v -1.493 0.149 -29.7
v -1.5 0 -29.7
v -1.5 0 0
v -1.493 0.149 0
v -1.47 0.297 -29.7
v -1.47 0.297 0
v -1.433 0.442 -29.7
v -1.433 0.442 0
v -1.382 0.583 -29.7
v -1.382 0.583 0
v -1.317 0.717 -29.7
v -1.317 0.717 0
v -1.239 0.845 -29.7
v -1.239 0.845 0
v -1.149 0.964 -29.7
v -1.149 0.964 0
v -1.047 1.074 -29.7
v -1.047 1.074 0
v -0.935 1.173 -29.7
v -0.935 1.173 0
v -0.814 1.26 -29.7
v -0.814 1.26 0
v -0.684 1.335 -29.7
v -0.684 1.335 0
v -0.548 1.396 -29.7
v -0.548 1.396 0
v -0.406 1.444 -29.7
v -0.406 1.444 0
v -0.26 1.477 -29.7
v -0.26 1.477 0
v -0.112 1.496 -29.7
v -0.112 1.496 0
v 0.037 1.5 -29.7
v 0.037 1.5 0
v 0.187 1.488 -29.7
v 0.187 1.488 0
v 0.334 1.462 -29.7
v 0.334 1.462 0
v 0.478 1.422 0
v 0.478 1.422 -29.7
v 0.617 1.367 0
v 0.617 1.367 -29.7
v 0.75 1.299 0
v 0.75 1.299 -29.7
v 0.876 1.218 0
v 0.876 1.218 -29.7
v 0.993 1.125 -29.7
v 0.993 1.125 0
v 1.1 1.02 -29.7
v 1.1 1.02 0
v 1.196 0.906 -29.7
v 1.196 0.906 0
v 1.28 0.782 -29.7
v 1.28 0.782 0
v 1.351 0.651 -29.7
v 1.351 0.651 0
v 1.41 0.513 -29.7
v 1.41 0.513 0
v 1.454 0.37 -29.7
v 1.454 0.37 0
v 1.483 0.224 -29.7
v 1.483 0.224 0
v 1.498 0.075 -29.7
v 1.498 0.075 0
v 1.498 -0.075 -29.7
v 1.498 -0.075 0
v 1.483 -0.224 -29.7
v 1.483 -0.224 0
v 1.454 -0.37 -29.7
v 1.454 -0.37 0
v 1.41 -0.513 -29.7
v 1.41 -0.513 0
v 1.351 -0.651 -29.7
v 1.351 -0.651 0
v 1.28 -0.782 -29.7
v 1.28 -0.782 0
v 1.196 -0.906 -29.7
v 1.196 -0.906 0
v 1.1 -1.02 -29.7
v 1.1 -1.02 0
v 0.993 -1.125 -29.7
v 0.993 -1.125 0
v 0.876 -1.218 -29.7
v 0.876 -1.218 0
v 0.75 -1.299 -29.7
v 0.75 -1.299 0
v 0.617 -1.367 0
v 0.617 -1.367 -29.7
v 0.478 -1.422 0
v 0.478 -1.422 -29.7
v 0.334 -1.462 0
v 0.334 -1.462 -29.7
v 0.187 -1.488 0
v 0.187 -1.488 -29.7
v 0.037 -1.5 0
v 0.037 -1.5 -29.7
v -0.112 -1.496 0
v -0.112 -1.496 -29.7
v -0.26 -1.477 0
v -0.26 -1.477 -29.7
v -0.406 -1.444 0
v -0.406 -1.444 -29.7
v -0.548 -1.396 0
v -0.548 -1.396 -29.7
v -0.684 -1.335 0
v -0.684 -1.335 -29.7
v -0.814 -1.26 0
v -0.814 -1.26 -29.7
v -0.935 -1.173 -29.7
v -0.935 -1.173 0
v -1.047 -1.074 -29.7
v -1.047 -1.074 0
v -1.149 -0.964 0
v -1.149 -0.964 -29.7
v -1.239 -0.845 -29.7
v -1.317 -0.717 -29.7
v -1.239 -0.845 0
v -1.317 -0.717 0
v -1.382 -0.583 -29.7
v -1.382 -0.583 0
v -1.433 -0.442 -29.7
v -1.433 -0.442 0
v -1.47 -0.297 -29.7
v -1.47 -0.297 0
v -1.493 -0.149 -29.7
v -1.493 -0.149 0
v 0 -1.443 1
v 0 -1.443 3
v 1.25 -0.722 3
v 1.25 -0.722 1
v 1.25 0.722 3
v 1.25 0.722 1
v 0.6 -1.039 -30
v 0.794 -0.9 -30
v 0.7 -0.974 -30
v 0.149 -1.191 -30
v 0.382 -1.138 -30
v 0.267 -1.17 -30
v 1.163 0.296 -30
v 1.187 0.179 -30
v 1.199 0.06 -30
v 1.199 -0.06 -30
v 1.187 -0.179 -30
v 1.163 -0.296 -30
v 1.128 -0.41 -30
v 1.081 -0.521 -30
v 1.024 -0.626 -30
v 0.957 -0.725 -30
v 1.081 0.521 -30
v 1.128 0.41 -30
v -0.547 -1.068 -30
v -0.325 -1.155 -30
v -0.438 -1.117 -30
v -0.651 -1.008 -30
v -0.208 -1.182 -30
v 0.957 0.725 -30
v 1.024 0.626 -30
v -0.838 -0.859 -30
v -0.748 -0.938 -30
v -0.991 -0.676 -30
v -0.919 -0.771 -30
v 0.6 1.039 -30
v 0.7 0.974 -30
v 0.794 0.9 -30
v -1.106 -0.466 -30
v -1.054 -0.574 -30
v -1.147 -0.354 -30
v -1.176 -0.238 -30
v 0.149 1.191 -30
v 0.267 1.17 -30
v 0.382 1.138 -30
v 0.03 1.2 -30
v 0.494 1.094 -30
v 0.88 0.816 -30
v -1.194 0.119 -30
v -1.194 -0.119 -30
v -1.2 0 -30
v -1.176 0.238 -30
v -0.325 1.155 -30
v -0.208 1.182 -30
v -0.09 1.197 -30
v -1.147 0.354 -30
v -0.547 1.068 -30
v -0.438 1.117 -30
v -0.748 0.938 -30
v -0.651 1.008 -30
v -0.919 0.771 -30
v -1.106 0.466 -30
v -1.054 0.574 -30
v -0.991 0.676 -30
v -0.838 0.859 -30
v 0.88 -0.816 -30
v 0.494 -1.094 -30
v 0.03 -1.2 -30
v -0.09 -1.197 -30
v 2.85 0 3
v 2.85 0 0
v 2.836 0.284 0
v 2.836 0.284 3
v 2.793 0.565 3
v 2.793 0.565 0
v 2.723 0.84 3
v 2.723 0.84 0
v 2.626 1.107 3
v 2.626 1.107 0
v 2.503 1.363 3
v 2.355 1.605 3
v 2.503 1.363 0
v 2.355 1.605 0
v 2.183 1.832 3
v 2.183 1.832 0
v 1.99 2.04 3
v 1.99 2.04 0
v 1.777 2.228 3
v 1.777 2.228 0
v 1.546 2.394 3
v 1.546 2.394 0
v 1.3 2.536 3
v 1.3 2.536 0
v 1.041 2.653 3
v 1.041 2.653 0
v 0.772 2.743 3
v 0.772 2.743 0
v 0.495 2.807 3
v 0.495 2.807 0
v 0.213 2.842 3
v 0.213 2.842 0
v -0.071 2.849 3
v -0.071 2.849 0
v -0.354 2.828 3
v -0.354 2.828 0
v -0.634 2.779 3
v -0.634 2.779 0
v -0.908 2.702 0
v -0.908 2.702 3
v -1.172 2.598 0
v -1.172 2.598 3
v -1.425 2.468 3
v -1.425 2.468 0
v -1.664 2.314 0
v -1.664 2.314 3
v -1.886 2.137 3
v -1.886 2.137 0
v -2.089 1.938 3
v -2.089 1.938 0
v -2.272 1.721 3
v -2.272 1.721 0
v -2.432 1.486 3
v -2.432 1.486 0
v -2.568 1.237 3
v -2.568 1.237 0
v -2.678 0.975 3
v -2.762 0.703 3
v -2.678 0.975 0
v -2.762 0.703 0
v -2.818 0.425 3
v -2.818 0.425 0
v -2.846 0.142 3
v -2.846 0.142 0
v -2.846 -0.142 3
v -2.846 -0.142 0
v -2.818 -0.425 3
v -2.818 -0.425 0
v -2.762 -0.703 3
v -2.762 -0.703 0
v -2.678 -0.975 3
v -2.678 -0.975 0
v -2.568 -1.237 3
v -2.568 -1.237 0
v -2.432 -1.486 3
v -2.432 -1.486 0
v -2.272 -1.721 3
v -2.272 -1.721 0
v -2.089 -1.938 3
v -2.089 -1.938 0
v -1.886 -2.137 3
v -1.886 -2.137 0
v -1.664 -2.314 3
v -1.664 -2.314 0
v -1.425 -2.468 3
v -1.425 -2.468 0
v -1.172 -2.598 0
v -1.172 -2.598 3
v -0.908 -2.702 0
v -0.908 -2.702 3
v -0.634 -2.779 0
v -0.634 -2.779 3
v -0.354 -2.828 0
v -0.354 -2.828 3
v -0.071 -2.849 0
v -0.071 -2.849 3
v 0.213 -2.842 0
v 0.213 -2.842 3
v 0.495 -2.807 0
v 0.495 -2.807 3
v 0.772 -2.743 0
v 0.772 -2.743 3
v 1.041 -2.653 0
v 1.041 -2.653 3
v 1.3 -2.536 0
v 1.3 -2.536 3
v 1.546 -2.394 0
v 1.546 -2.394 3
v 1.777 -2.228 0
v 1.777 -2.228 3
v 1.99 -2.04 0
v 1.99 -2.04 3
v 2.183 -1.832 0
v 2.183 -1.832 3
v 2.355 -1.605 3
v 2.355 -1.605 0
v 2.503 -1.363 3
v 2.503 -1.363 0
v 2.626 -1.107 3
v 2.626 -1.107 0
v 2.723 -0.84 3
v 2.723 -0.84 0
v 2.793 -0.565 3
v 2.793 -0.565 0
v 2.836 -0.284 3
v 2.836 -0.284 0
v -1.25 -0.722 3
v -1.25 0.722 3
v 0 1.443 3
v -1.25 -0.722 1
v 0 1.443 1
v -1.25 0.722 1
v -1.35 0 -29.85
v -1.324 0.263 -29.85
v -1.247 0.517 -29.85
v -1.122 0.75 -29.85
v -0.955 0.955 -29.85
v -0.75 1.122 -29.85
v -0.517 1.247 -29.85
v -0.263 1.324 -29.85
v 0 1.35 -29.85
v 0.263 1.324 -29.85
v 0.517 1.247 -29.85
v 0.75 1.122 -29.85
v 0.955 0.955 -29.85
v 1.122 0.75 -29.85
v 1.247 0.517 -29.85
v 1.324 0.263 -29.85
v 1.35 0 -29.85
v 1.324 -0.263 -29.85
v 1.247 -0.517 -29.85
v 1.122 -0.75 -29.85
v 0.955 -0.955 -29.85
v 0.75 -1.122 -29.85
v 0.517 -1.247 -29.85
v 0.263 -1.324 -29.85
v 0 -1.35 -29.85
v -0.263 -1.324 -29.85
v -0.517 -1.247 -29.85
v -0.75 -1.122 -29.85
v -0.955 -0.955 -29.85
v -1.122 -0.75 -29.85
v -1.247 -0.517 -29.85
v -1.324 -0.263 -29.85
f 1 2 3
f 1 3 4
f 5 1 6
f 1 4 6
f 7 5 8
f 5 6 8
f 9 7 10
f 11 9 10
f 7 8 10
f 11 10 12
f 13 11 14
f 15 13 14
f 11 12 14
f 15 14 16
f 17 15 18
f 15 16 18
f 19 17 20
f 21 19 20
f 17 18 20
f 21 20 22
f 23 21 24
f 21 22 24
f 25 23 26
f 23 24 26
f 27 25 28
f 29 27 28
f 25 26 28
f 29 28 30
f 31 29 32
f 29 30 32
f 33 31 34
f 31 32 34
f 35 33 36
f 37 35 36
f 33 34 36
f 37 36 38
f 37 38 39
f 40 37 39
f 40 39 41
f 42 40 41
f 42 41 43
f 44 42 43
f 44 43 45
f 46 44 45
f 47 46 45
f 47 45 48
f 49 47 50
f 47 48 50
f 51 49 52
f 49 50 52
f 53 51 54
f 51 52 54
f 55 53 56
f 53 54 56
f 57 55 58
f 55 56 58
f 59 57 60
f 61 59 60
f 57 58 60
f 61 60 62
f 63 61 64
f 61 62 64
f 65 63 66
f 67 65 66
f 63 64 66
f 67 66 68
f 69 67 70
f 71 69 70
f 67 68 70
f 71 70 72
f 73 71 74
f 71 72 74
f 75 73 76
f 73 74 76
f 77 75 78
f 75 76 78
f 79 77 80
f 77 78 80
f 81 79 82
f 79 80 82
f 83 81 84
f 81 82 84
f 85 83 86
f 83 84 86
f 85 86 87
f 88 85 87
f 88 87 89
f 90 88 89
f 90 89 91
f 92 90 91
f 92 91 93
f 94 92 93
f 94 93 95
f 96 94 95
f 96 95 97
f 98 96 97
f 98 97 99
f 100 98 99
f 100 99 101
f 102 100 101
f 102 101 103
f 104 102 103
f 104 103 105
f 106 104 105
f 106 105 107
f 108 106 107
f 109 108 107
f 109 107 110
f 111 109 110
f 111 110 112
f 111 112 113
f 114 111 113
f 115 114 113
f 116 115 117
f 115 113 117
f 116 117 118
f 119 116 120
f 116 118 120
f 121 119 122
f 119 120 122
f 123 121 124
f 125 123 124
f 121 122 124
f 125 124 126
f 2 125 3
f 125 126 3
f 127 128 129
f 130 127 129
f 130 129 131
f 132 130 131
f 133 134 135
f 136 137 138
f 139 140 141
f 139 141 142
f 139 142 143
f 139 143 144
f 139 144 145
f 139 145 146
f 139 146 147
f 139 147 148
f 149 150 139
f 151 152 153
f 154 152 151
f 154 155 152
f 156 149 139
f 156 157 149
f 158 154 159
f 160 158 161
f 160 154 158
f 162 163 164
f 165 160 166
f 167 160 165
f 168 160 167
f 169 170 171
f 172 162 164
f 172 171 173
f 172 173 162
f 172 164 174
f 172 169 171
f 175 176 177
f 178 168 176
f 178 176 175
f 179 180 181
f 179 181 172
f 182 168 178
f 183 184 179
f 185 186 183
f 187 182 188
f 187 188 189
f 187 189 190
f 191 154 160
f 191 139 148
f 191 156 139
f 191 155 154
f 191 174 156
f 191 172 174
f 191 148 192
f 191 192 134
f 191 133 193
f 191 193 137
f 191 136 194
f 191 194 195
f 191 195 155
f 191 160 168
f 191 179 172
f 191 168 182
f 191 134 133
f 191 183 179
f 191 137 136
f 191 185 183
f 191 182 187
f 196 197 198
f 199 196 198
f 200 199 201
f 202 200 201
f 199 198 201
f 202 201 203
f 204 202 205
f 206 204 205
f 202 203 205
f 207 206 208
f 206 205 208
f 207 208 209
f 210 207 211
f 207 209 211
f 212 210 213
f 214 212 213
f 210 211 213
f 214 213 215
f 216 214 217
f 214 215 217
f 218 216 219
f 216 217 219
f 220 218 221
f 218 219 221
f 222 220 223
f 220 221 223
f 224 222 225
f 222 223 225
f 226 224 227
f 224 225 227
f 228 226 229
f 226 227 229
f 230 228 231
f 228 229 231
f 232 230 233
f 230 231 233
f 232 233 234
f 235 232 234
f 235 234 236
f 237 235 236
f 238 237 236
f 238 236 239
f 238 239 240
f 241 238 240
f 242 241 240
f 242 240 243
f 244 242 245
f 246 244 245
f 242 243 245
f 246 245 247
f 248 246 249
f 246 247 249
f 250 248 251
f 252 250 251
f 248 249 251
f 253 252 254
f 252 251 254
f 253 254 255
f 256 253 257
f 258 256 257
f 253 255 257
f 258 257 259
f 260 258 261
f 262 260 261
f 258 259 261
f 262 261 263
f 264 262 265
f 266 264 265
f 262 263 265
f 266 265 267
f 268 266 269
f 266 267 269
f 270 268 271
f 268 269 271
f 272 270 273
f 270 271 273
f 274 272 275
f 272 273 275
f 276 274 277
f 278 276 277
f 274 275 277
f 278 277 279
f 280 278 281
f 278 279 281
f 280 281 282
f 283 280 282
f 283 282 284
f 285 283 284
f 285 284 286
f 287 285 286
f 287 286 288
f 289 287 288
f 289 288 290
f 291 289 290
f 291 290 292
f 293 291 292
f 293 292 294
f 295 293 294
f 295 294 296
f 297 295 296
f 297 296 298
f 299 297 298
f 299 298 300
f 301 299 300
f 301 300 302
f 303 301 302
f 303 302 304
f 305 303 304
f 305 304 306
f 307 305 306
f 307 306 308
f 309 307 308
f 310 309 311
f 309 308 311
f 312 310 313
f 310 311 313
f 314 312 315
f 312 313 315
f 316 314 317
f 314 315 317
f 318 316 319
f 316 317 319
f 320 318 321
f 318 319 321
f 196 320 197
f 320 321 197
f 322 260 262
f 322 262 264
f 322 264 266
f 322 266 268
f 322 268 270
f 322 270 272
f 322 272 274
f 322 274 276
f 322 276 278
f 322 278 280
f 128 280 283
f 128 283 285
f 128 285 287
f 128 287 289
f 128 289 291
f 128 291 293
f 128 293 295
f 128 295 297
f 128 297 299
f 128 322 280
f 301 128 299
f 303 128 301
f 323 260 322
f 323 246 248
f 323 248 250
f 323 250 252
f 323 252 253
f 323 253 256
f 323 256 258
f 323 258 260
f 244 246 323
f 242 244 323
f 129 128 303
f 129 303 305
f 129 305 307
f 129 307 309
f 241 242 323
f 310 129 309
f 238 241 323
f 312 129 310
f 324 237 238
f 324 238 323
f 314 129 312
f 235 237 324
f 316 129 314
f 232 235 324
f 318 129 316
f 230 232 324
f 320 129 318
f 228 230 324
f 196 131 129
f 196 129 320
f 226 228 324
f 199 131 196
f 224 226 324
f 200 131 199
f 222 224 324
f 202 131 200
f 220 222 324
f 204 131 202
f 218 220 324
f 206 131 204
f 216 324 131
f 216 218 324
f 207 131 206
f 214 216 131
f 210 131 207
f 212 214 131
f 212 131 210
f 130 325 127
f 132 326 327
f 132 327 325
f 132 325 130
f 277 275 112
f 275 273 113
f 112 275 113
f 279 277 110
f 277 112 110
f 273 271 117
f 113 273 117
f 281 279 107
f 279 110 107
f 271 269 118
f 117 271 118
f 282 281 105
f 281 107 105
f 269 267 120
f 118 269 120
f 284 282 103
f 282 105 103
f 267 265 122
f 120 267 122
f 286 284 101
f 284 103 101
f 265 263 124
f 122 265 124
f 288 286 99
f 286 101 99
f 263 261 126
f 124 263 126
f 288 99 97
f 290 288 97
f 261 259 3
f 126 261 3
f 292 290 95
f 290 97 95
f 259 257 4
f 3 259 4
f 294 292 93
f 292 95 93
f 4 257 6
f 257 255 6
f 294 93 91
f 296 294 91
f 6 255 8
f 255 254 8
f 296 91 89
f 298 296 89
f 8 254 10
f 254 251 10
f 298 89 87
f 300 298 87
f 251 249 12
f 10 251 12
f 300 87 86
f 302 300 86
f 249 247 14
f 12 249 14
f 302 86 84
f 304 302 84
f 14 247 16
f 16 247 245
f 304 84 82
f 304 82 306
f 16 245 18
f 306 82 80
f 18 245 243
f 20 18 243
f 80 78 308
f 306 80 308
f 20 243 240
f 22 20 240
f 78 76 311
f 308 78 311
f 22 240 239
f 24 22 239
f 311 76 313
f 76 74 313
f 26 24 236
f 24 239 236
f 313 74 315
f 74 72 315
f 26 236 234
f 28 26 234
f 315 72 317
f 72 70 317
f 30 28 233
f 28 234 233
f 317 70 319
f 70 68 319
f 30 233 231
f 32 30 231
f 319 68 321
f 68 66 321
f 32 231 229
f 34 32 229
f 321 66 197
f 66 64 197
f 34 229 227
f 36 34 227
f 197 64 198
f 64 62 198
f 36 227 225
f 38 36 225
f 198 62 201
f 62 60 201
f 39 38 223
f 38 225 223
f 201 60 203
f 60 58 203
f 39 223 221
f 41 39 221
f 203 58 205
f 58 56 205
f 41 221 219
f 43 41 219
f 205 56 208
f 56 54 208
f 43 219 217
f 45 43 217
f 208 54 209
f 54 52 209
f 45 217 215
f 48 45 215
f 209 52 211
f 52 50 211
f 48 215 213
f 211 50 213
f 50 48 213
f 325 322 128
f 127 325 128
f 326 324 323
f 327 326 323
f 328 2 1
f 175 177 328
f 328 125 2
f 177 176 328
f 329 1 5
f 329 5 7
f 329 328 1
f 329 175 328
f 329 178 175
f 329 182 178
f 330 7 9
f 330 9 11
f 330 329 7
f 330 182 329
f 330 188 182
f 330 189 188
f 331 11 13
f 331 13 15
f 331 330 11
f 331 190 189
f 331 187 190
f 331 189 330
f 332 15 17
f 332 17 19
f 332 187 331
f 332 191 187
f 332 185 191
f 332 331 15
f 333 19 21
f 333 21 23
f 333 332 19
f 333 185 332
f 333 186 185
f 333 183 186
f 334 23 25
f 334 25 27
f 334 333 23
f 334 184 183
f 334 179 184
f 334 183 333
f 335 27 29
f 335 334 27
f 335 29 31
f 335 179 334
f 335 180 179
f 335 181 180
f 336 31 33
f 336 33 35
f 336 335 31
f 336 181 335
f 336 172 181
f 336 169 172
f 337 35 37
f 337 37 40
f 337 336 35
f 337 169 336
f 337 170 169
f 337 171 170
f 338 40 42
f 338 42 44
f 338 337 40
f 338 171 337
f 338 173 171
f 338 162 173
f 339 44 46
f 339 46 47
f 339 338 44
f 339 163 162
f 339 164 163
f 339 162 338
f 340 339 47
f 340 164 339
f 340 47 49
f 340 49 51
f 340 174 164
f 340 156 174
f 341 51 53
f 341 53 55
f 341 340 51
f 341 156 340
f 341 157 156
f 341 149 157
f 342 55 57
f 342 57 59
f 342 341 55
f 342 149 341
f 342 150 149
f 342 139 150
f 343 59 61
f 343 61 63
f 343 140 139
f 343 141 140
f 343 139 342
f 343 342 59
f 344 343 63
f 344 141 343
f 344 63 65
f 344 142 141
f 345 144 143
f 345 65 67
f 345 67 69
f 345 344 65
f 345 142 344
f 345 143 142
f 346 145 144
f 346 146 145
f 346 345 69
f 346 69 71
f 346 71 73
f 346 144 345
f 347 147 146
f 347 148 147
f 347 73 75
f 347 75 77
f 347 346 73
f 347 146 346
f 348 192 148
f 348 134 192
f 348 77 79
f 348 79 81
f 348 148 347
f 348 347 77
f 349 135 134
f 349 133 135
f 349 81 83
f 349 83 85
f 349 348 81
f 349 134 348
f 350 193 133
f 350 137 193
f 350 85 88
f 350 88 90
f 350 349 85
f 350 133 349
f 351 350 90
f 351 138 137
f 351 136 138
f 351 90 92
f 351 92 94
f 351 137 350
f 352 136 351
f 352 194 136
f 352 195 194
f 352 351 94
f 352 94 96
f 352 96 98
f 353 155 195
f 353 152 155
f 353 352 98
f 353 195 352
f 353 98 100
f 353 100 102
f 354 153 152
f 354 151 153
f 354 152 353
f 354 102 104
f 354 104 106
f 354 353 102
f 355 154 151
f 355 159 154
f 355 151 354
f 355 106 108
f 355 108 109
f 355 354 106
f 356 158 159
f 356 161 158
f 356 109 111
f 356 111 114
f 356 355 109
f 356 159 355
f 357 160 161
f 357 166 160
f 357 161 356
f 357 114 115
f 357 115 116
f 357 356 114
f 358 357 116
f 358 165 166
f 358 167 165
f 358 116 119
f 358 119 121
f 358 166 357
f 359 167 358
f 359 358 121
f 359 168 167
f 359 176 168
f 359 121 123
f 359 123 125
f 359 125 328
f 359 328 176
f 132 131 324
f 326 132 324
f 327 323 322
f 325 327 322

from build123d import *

# Parameters (mm, degrees)
SKETCH1_R           = 2.85
BOSS_EXTRUDE1_DEPTH = 3
SKETCH2_R           = 1.5
BOSS_EXTRUDE2_DEPTH = 30
CHAMFER1_SIZE       = 0.3
CUT_EXTRUDE1_DEPTH  = 2


with BuildPart() as part:
    # Sketch1 → Boss-Extrude1 (new body)
    with BuildSketch(Plane.XY):
        Circle(SKETCH1_R)
    extrude(amount=BOSS_EXTRUDE1_DEPTH)

    # Sketch2 → Boss-Extrude2 (add)
    with BuildSketch(Plane(origin=(0, 0, 0), x_dir=(-1, 0, 0), z_dir=(0, 0, -1))):
        Circle(SKETCH2_R)
    extrude(amount=BOSS_EXTRUDE2_DEPTH)

    # Chamfer1
    chamfer1_edges = [part.edges().sort_by_distance(p)[0] for p in [
        (1.5, 0, -30),
    ]]
    chamfer(chamfer1_edges, length=CHAMFER1_SIZE)

    # Sketch3 → Cut-Extrude1 (cut)
    with BuildSketch(Plane.XY.offset(3)):
        Polygon((0, 1.443375673), (-1.25, 0.721687836), (-1.25, -0.721687836), (0, -1.443375673), (1.25, -0.721687836), (1.25, 0.721687836), align=None)
    extrude(amount=-CUT_EXTRUDE1_DEPTH, mode=Mode.SUBTRACT)


solid = part.part
